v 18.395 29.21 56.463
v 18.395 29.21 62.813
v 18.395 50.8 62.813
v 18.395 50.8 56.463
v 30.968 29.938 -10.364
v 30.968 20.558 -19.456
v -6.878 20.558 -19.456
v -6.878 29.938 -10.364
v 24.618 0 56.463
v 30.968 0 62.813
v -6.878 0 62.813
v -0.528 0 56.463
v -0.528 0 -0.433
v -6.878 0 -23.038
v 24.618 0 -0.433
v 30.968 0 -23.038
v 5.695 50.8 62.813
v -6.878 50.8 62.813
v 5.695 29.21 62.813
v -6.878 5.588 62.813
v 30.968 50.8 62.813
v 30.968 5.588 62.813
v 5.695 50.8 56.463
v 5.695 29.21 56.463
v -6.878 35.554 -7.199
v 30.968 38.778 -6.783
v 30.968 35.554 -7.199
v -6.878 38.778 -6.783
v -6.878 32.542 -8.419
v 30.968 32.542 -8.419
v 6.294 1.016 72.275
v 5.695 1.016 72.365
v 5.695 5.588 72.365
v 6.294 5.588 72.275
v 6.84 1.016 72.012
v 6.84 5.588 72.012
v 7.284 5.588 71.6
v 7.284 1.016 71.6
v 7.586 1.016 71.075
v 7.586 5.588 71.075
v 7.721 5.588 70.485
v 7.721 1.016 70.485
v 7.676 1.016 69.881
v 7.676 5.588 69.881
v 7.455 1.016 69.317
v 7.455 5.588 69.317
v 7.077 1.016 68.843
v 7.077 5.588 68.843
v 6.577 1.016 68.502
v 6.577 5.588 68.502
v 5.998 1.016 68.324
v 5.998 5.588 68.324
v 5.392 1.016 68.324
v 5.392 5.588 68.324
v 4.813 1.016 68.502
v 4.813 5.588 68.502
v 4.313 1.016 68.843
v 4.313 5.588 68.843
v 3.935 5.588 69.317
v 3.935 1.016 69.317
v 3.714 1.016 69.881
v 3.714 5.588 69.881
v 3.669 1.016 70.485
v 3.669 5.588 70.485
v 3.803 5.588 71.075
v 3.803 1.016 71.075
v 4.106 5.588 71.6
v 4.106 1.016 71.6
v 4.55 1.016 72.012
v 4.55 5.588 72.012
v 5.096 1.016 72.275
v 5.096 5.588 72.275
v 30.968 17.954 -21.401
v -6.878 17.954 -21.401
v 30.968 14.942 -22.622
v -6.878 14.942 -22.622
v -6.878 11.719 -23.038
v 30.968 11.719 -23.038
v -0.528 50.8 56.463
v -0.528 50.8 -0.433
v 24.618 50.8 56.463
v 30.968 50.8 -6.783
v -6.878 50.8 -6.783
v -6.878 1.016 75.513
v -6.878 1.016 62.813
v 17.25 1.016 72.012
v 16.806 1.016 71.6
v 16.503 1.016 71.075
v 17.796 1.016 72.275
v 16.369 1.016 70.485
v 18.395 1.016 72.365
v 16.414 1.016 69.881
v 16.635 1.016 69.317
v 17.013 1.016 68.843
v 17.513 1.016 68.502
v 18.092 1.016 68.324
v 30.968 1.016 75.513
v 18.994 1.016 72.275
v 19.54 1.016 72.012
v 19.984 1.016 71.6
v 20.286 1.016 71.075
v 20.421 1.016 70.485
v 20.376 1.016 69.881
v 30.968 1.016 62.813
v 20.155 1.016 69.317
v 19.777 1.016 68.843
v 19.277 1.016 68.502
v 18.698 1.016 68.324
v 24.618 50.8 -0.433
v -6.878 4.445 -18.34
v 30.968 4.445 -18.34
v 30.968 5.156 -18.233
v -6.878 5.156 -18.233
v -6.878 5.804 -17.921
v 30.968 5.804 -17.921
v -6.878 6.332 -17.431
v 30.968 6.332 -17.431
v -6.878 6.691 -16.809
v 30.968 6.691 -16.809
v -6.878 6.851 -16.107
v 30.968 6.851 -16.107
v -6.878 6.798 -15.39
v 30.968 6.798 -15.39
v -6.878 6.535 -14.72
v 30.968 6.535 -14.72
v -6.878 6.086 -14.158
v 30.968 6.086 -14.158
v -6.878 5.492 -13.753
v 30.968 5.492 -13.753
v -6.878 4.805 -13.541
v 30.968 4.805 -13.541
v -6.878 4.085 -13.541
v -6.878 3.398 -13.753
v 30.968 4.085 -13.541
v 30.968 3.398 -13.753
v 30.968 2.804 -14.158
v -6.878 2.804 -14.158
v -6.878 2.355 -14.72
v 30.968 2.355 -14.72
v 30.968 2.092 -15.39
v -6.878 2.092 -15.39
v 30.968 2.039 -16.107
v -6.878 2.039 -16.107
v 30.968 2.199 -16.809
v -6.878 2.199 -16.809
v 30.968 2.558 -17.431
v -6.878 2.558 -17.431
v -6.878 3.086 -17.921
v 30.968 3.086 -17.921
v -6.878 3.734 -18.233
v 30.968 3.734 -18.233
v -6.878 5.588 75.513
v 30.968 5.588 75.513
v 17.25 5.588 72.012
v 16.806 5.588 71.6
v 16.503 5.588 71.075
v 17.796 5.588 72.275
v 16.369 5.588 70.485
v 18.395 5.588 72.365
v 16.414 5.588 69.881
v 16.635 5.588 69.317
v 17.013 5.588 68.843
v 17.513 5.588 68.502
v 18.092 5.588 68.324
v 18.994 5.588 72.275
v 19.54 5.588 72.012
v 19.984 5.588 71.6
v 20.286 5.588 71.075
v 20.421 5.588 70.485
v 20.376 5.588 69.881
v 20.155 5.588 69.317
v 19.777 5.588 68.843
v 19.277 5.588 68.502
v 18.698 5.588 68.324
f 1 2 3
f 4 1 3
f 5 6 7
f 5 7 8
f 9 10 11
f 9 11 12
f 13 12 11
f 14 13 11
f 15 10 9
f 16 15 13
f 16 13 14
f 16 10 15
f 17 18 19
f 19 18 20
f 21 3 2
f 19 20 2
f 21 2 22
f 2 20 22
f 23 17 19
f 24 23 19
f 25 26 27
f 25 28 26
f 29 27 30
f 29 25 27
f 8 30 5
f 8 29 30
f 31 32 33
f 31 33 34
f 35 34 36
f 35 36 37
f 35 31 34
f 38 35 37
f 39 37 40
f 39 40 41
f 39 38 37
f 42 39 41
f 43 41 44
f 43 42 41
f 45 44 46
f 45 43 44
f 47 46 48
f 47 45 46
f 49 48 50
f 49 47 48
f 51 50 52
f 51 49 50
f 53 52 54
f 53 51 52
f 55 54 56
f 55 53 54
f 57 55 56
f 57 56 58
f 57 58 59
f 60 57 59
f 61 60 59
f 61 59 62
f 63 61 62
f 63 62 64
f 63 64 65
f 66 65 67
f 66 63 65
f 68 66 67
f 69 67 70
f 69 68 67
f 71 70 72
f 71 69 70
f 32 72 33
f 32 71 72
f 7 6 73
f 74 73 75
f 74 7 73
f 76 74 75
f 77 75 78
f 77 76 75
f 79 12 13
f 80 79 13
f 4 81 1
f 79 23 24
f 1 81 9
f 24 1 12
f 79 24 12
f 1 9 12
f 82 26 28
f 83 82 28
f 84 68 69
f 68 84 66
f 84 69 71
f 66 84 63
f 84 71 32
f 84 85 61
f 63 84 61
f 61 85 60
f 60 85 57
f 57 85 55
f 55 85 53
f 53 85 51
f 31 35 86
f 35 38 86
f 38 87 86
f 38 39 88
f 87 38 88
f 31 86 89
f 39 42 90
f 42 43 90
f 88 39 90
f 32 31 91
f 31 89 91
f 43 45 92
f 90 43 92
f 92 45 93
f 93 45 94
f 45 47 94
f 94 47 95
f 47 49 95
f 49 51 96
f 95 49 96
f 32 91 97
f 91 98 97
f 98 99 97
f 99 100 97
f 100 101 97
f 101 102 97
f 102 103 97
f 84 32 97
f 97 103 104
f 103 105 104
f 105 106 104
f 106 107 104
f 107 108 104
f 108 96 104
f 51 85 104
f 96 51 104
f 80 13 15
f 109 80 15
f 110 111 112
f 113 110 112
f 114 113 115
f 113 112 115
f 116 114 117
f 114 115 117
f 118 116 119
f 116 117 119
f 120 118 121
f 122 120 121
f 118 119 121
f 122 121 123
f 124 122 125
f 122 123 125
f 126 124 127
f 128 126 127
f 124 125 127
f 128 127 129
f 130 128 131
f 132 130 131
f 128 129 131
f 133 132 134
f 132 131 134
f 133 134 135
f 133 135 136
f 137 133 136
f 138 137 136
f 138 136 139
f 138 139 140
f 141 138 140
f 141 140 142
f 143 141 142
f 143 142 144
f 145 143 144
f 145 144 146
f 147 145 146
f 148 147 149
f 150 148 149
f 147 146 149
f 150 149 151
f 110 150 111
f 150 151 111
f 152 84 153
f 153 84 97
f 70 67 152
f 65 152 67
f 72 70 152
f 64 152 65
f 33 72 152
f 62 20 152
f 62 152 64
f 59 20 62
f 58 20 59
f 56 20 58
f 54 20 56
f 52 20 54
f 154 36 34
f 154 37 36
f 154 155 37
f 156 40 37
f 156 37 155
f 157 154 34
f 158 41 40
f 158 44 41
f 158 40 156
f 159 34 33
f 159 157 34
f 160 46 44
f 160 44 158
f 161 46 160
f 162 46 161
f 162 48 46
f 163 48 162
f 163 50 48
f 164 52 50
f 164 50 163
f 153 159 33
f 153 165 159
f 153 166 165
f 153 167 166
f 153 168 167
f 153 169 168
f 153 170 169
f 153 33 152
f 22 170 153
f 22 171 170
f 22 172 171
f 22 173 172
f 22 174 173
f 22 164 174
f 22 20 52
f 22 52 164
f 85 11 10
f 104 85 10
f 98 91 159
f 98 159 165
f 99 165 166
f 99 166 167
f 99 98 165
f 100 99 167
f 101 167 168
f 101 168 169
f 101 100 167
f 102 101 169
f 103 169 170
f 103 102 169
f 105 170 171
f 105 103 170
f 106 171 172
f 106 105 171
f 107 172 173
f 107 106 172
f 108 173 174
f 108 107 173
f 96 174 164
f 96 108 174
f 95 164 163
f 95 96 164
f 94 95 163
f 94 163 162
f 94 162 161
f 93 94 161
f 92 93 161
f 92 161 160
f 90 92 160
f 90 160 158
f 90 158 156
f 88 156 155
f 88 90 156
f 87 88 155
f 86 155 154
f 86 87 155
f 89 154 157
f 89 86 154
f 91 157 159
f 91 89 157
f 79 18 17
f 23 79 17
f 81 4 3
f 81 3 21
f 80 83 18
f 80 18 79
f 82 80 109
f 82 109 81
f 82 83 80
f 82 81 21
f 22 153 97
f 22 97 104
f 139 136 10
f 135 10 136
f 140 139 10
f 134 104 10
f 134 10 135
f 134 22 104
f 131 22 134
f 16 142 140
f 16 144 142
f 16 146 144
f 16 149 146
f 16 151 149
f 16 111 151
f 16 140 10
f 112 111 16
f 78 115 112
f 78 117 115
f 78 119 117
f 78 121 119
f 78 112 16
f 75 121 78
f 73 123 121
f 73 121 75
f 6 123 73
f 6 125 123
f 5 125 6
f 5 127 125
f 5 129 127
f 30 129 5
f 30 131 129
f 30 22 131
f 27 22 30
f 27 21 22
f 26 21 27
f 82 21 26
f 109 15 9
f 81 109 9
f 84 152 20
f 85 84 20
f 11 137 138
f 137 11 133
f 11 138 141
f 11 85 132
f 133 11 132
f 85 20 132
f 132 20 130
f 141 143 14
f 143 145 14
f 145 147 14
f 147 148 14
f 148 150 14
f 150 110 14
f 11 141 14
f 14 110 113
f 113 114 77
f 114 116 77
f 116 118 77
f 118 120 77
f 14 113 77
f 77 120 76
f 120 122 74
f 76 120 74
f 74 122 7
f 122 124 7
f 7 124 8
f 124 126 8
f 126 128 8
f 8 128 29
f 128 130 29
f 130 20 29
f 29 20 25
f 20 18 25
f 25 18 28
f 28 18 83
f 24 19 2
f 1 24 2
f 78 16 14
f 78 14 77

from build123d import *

# Parameters (mm, degrees)
BOSS_EXTRUDE1_DEPTH = 50.8
CUT_EXTRUDE1_DEPTH  = 50.8
SKETCH5_R           = 2.032
BOSS_EXTRUDE2_DEPTH = 4.572
SKETCH8_R           = 2.413
BOSS_EXTRUDE3_DEPTH = 37.846
FILLET1_R           = 12.7


with BuildPart() as part:
    # Sketch1 → Boss-Extrude1 (new body)
    with BuildSketch(Plane(origin=(0, 0, 0), x_dir=(1, 0, 0), z_dir=(0, 1, 0))):
        Polygon((-0.528142549, -56.463008639), (-0.528142549, -28.015008639), (-6.878142549, -28.015008639), (-6.878142549, -62.813008639), (12.044857451, -62.813008639), (12.044857451, -56.463008639), align=None)
        Polygon((-0.528142549, -28.015008639), (-0.528142549, 0.432991361), (12.044857451, 0.432991361), (12.044857451, 6.782991361), (-6.878142549, 6.782991361), (-6.878142549, -28.015008639), align=None)
        Polygon((12.044857451, 6.782991361), (12.044857451, 0.432991361), (24.617857451, 0.432991361), (24.617857451, -28.015008639), (30.967857451, -28.015008639), (30.967857451, 6.782991361), align=None)
        Polygon((24.617857451, -56.463008639), (12.044857451, -56.463008639), (12.044857451, -62.813008639), (30.967857451, -62.813008639), (30.967857451, -28.015008639), (24.617857451, -28.015008639), align=None)
    extrude(amount=BOSS_EXTRUDE1_DEPTH)

    # Sketch3 → Cut-Extrude1 (cut)
    with BuildSketch(Plane.XY.offset(62.813008639)):
        Polygon((5.694857451, 29.21), (12.044857451, 29.21), (18.394857451, 29.21), (18.394857451, 50.8), (5.694857451, 50.8), align=None)
    extrude(amount=-CUT_EXTRUDE1_DEPTH, mode=Mode.SUBTRACT)

    # Sketch5 → Boss-Extrude2 (add)
    with BuildSketch(Plane(origin=(0, 1.016, 0), x_dir=(1, 0, 0), z_dir=(0, 1, 0))):
        Polygon((30.967857451, -62.813008639), (12.044857451, -62.813008639), (-6.878142549, -62.813008639), (-6.878142549, -75.513008639), (30.967857451, -75.513008639), align=None)
        with Locations(Location((5.694857451, -70.332821617, 0), (0, 0, 270))):
            Circle(SKETCH5_R, mode=Mode.SUBTRACT)
        with Locations(Location((18.394857451, -70.332821617, 0), (0, 0, 270))):
            Circle(SKETCH5_R, mode=Mode.SUBTRACT)
    extrude(amount=BOSS_EXTRUDE2_DEPTH)

    # Sketch8 → Boss-Extrude3 (add)
    with BuildSketch(Plane(origin=(30.967857451, 0, 0), x_dir=(0, 0, -1), z_dir=(1, 0, 0))):
        Polygon((6.782991361, 0), (15.926991361, 0), (23.037514196, 0), (23.037514196, 16.864021844), (6.782991361, 33.63258694), align=None)
        with Locations((15.926991361, 4.445)):
            Circle(SKETCH8_R, mode=Mode.SUBTRACT)
    extrude(amount=-BOSS_EXTRUDE3_DEPTH)

    # Fillet1
    fillet1_edges = [part.edges().sort_by_distance(p)[0] for p in [
        (12.044857451, 33.63258694, -6.782991361),
        (12.044857451, 16.864021844, -23.037514196),
    ]]
    fillet(fillet1_edges, radius=FILLET1_R)


solid = part.part
